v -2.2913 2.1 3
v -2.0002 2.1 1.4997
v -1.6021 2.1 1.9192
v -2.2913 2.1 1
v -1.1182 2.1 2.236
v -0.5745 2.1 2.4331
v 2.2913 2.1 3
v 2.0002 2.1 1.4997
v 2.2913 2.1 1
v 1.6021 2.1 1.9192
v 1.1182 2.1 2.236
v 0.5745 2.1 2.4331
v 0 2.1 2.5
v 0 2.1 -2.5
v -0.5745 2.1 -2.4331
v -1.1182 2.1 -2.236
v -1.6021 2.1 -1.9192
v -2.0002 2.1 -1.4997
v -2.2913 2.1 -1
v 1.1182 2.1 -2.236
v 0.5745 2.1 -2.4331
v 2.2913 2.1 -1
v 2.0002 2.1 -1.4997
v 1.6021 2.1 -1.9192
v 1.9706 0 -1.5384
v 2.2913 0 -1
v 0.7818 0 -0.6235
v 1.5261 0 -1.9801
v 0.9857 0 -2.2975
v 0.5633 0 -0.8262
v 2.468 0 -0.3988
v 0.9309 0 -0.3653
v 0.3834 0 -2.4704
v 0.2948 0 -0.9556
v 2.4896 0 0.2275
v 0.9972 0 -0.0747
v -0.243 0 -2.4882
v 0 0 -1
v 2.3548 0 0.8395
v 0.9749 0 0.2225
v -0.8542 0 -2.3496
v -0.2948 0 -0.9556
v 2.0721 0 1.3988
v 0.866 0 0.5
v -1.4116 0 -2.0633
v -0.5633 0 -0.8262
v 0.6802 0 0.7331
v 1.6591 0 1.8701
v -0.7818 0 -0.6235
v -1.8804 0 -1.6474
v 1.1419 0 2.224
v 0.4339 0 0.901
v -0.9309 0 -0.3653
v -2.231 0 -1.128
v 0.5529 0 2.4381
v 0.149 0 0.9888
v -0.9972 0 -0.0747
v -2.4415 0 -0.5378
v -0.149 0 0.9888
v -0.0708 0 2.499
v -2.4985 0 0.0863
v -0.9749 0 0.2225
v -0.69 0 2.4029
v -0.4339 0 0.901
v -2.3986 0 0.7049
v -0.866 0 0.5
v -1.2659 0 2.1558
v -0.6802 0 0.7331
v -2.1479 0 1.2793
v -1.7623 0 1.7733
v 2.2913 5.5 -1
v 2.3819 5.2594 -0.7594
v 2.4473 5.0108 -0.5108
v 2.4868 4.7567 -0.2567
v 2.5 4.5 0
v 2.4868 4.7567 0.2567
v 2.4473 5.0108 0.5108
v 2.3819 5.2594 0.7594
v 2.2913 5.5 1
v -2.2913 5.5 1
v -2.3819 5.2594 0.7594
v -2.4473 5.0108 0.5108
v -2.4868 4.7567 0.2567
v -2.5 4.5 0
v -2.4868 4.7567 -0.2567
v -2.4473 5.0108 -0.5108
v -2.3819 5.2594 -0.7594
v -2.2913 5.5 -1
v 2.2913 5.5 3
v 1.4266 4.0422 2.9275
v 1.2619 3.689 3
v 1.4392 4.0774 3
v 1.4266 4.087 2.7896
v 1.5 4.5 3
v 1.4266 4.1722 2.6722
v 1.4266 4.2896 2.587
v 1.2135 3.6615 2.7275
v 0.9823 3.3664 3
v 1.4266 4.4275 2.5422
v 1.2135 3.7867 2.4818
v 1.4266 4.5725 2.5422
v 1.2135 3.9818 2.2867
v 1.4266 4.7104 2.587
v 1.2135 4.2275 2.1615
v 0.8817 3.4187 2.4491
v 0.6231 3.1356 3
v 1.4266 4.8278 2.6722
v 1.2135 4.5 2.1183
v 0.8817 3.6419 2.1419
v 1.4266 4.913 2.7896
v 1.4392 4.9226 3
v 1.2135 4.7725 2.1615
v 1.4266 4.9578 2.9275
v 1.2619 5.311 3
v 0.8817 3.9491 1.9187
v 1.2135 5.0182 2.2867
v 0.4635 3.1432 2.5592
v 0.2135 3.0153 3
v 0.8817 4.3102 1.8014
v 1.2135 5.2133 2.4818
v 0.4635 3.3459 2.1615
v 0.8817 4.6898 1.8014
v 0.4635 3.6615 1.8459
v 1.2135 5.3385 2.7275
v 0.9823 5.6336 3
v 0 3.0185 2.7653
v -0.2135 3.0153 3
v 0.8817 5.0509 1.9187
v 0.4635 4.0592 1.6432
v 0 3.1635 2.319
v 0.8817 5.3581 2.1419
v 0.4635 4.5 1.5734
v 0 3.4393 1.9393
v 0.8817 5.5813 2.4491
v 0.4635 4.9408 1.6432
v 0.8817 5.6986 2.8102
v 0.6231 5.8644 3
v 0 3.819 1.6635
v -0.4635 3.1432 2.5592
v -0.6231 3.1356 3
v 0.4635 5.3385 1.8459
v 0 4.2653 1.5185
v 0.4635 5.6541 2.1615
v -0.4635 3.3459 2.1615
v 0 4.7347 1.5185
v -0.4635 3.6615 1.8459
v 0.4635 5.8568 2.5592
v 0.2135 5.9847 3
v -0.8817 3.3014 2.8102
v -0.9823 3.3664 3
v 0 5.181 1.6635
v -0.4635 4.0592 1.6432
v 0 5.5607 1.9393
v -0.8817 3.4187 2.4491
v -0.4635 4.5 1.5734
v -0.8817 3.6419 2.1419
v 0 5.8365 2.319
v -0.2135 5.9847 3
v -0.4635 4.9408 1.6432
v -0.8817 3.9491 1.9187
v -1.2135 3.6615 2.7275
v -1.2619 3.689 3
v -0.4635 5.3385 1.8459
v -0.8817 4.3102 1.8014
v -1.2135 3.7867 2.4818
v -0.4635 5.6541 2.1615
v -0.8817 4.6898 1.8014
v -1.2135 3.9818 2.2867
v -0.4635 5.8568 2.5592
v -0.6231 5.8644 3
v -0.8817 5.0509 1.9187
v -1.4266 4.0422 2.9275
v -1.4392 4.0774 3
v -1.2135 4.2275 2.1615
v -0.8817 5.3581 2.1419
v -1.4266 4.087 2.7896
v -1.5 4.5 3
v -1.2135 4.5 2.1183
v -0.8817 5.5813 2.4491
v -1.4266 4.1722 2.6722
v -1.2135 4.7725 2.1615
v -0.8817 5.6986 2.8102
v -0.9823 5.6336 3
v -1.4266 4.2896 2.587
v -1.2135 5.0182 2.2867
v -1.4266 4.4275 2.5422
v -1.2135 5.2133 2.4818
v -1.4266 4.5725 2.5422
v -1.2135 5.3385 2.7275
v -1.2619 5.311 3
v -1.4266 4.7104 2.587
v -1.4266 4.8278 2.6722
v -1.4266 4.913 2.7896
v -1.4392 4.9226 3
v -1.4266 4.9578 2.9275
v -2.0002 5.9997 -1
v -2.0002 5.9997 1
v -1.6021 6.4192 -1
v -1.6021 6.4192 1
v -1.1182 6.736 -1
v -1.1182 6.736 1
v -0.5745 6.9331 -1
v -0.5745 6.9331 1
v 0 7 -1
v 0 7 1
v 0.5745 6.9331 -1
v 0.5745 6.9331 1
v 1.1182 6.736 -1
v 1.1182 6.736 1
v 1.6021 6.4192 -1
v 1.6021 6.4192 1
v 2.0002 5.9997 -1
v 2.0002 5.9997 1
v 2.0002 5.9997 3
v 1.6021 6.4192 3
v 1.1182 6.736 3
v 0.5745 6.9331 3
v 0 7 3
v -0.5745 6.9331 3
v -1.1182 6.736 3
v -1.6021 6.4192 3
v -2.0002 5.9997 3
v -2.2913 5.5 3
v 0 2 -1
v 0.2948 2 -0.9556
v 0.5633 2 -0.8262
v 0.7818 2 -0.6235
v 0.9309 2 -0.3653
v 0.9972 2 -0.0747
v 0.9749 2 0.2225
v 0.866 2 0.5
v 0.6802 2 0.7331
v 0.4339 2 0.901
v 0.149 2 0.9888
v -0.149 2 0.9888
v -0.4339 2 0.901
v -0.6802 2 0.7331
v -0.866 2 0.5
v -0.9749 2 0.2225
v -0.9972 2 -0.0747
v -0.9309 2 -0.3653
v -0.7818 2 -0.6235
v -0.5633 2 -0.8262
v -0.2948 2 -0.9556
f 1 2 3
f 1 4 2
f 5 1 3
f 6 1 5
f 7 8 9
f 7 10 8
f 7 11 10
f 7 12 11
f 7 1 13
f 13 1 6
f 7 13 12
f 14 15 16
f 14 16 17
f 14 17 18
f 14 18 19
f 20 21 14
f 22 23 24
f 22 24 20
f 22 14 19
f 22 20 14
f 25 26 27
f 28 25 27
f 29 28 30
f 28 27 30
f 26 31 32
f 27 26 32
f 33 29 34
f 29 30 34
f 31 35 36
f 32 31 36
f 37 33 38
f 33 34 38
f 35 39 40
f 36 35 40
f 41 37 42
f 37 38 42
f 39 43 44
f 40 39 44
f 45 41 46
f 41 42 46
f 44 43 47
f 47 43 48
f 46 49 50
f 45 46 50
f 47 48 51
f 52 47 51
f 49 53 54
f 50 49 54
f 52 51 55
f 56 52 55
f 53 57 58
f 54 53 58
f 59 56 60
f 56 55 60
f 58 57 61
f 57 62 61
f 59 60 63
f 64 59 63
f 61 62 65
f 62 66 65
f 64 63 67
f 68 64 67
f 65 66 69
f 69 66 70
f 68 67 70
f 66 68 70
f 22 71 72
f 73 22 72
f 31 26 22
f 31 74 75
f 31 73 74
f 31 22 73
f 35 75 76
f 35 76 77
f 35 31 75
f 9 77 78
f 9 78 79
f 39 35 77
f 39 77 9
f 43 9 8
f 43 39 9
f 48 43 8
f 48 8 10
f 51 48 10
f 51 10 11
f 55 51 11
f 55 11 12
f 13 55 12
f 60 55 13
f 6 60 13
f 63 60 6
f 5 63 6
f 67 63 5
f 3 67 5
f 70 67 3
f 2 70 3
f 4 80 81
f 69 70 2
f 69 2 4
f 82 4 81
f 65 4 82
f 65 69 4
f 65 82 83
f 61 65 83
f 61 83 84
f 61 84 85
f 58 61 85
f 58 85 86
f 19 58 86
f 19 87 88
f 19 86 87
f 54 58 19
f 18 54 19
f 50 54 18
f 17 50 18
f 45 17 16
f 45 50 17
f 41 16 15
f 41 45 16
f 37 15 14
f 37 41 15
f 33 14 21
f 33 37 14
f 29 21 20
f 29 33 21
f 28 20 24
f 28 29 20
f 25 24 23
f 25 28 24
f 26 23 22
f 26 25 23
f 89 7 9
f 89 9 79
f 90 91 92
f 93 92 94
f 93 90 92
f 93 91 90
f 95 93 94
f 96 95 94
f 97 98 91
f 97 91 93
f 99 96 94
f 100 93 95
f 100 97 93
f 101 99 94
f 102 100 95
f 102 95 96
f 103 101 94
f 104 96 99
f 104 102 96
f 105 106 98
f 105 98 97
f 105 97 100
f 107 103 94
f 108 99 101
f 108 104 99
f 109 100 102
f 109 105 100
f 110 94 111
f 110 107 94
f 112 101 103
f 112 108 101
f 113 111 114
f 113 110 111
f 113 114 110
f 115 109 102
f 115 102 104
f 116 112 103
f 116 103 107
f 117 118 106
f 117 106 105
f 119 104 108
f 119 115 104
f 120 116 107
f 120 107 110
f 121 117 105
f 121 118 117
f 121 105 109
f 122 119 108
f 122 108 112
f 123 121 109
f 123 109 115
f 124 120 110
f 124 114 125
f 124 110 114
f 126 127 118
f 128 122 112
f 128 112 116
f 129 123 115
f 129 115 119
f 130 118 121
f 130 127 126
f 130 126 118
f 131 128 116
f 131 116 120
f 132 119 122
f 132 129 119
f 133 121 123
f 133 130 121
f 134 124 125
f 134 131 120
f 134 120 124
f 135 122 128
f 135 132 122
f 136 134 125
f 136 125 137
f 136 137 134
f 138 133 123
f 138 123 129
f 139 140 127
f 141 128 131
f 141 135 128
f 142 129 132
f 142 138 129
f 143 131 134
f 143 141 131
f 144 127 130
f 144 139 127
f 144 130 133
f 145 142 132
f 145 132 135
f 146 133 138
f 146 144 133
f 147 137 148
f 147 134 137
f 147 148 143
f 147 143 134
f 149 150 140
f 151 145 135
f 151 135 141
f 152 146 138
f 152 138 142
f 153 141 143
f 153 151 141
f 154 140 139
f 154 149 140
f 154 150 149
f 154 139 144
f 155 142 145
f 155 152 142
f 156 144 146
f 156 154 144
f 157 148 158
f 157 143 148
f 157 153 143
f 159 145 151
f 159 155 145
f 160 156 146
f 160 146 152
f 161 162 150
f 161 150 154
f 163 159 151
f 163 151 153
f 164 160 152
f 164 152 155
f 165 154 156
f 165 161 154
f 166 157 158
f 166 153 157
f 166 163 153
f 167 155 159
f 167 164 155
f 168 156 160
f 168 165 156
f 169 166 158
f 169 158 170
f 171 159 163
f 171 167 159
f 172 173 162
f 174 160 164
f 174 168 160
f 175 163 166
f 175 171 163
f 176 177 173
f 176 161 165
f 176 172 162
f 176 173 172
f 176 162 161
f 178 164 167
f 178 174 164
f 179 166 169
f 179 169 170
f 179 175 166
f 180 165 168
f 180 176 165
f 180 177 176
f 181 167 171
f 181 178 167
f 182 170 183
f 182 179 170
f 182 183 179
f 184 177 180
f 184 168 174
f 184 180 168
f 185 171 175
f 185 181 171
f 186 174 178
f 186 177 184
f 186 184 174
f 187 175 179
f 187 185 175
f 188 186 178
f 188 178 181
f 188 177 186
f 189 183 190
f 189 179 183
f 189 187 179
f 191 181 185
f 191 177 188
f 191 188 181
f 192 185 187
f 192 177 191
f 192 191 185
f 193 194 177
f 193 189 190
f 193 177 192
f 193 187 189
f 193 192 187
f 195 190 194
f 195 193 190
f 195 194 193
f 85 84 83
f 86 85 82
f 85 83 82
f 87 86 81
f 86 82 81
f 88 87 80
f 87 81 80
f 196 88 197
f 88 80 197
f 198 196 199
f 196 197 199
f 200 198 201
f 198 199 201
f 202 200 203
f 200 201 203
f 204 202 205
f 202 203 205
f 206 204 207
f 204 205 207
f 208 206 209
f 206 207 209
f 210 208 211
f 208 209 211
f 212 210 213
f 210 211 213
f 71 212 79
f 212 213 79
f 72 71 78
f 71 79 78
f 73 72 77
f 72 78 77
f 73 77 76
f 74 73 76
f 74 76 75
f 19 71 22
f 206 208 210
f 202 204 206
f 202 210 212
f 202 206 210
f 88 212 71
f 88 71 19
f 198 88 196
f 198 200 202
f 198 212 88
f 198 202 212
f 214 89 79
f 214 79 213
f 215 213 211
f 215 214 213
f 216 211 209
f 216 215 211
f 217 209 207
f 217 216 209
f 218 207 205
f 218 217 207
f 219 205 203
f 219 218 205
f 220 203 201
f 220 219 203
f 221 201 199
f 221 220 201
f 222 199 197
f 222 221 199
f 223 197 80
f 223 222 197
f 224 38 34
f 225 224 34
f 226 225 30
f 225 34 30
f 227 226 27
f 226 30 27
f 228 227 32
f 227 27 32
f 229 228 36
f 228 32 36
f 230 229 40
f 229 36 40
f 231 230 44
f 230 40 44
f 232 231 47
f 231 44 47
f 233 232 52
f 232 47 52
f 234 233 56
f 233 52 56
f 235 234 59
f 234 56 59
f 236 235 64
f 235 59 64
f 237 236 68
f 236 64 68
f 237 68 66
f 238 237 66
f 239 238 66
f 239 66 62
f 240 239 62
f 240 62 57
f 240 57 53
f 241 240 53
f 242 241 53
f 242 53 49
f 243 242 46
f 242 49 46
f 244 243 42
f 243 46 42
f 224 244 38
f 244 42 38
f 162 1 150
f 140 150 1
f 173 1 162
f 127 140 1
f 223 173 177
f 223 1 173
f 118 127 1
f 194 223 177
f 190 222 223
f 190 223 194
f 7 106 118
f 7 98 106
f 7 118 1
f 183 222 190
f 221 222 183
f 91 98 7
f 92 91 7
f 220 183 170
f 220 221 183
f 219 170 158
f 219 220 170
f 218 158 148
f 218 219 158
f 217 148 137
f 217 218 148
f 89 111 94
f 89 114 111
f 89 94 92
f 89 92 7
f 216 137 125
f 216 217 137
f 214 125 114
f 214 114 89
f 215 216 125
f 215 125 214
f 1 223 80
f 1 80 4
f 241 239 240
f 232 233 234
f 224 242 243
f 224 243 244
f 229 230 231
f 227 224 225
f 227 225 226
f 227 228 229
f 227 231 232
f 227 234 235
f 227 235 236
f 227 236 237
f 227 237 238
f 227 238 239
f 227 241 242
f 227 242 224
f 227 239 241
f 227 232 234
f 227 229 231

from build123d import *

# Parameters (mm, degrees)
SKETCH1_R           = 2.5
SKETCH1_R_2         = 1
BOSS_EXTRUDE2_DEPTH = 2.1
BOSS_EXTRUDE3_DEPTH = 1
SKETCH4_R           = 1
CUT_EXTRUDE13_DEPTH = 2
SKETCH6_OUTSIDE_W   = 8.99
SKETCH6_OUTSIDE_H   = 8.99
SKETCH6_OUTSIDE_R   = 2.5
CUT_EXTRUDE14_DEPTH = 8.842193571
BOSS_EXTRUDE4_START = 2
BOSS_EXTRUDE4_DEPTH = 2


with BuildPart() as part:
    # Sketch1 → Boss-Extrude2 (new body)
    with BuildSketch(Plane(origin=(0, 0, 0), x_dir=(1, 0, 0), z_dir=(0, 1, 0))):
        with Locations(Location((0, 0, 0), (0, 0, 270))):
            Circle(SKETCH1_R)
        with Locations(Location((0, 0, 0), (0, 0, 270))):
            Circle(SKETCH1_R_2, mode=Mode.SUBTRACT)
    extrude(amount=BOSS_EXTRUDE2_DEPTH)

    # Sketch2 → Boss-Extrude3 (add, symmetric)
    with BuildSketch(Plane.XY):
        with BuildLine():
            Line((2.5, 4.5), (2.5, 0))
            Line((2.5, 0), (-2.5, 0))
            Line((-2.5, 0), (-2.5, 4.5))
            ThreePointArc((-2.5, 4.5), (0, 7), (2.5, 4.5))
        make_face()
    extrude(amount=BOSS_EXTRUDE3_DEPTH, both=True)

    # Sketch4 → Cut-Extrude13 (cut)
    with BuildSketch(Plane.XZ):
        with Locations(Location((0, 0, 0), (0, 0, 270))):
            Circle(SKETCH4_R)
    extrude(amount=-CUT_EXTRUDE13_DEPTH, mode=Mode.SUBTRACT)

    # Sketch6 outside → Cut-Extrude14 (cut, through all)
    with BuildSketch(Plane.XZ):
        Rectangle(SKETCH6_OUTSIDE_W, SKETCH6_OUTSIDE_H)
        with Locations(Location((0, 0, 0), (0, 0, 336.421821522))):
            Circle(SKETCH6_OUTSIDE_R, mode=Mode.SUBTRACT)
    extrude(amount=-CUT_EXTRUDE14_DEPTH, mode=Mode.SUBTRACT)

    # Sketch7 → Boss-Extrude4 (add)
    with BuildSketch(Plane.XY.offset(1).offset(BOSS_EXTRUDE4_START)):
        with BuildLine():
            Line((2.291287847, 2.1), (2.291287847, 5.5))
            ThreePointArc((2.291287847, 5.5), (0, 7), (-2.291287847, 5.5))
            Line((-2.291287847, 5.5), (-2.291287847, 2.1))
            Line((-2.291287847, 2.1), (2.291287847, 2.1))
        make_face()
    extrude(amount=-BOSS_EXTRUDE4_DEPTH)

    # Sketch9 → Cut-Revolve1 (revolve, cut)
    with BuildSketch(Plane.XY.offset(3)):
        with BuildLine():
            Line((-1.5, 4.5), (1.5, 4.5))
            ThreePointArc((1.5, 4.5), (0, 6), (-1.5, 4.5))
        make_face()
    revolve(axis=Axis((-1.5, 4.5, 3), (1, 0, 0)), mode=Mode.SUBTRACT)


solid = part.part
